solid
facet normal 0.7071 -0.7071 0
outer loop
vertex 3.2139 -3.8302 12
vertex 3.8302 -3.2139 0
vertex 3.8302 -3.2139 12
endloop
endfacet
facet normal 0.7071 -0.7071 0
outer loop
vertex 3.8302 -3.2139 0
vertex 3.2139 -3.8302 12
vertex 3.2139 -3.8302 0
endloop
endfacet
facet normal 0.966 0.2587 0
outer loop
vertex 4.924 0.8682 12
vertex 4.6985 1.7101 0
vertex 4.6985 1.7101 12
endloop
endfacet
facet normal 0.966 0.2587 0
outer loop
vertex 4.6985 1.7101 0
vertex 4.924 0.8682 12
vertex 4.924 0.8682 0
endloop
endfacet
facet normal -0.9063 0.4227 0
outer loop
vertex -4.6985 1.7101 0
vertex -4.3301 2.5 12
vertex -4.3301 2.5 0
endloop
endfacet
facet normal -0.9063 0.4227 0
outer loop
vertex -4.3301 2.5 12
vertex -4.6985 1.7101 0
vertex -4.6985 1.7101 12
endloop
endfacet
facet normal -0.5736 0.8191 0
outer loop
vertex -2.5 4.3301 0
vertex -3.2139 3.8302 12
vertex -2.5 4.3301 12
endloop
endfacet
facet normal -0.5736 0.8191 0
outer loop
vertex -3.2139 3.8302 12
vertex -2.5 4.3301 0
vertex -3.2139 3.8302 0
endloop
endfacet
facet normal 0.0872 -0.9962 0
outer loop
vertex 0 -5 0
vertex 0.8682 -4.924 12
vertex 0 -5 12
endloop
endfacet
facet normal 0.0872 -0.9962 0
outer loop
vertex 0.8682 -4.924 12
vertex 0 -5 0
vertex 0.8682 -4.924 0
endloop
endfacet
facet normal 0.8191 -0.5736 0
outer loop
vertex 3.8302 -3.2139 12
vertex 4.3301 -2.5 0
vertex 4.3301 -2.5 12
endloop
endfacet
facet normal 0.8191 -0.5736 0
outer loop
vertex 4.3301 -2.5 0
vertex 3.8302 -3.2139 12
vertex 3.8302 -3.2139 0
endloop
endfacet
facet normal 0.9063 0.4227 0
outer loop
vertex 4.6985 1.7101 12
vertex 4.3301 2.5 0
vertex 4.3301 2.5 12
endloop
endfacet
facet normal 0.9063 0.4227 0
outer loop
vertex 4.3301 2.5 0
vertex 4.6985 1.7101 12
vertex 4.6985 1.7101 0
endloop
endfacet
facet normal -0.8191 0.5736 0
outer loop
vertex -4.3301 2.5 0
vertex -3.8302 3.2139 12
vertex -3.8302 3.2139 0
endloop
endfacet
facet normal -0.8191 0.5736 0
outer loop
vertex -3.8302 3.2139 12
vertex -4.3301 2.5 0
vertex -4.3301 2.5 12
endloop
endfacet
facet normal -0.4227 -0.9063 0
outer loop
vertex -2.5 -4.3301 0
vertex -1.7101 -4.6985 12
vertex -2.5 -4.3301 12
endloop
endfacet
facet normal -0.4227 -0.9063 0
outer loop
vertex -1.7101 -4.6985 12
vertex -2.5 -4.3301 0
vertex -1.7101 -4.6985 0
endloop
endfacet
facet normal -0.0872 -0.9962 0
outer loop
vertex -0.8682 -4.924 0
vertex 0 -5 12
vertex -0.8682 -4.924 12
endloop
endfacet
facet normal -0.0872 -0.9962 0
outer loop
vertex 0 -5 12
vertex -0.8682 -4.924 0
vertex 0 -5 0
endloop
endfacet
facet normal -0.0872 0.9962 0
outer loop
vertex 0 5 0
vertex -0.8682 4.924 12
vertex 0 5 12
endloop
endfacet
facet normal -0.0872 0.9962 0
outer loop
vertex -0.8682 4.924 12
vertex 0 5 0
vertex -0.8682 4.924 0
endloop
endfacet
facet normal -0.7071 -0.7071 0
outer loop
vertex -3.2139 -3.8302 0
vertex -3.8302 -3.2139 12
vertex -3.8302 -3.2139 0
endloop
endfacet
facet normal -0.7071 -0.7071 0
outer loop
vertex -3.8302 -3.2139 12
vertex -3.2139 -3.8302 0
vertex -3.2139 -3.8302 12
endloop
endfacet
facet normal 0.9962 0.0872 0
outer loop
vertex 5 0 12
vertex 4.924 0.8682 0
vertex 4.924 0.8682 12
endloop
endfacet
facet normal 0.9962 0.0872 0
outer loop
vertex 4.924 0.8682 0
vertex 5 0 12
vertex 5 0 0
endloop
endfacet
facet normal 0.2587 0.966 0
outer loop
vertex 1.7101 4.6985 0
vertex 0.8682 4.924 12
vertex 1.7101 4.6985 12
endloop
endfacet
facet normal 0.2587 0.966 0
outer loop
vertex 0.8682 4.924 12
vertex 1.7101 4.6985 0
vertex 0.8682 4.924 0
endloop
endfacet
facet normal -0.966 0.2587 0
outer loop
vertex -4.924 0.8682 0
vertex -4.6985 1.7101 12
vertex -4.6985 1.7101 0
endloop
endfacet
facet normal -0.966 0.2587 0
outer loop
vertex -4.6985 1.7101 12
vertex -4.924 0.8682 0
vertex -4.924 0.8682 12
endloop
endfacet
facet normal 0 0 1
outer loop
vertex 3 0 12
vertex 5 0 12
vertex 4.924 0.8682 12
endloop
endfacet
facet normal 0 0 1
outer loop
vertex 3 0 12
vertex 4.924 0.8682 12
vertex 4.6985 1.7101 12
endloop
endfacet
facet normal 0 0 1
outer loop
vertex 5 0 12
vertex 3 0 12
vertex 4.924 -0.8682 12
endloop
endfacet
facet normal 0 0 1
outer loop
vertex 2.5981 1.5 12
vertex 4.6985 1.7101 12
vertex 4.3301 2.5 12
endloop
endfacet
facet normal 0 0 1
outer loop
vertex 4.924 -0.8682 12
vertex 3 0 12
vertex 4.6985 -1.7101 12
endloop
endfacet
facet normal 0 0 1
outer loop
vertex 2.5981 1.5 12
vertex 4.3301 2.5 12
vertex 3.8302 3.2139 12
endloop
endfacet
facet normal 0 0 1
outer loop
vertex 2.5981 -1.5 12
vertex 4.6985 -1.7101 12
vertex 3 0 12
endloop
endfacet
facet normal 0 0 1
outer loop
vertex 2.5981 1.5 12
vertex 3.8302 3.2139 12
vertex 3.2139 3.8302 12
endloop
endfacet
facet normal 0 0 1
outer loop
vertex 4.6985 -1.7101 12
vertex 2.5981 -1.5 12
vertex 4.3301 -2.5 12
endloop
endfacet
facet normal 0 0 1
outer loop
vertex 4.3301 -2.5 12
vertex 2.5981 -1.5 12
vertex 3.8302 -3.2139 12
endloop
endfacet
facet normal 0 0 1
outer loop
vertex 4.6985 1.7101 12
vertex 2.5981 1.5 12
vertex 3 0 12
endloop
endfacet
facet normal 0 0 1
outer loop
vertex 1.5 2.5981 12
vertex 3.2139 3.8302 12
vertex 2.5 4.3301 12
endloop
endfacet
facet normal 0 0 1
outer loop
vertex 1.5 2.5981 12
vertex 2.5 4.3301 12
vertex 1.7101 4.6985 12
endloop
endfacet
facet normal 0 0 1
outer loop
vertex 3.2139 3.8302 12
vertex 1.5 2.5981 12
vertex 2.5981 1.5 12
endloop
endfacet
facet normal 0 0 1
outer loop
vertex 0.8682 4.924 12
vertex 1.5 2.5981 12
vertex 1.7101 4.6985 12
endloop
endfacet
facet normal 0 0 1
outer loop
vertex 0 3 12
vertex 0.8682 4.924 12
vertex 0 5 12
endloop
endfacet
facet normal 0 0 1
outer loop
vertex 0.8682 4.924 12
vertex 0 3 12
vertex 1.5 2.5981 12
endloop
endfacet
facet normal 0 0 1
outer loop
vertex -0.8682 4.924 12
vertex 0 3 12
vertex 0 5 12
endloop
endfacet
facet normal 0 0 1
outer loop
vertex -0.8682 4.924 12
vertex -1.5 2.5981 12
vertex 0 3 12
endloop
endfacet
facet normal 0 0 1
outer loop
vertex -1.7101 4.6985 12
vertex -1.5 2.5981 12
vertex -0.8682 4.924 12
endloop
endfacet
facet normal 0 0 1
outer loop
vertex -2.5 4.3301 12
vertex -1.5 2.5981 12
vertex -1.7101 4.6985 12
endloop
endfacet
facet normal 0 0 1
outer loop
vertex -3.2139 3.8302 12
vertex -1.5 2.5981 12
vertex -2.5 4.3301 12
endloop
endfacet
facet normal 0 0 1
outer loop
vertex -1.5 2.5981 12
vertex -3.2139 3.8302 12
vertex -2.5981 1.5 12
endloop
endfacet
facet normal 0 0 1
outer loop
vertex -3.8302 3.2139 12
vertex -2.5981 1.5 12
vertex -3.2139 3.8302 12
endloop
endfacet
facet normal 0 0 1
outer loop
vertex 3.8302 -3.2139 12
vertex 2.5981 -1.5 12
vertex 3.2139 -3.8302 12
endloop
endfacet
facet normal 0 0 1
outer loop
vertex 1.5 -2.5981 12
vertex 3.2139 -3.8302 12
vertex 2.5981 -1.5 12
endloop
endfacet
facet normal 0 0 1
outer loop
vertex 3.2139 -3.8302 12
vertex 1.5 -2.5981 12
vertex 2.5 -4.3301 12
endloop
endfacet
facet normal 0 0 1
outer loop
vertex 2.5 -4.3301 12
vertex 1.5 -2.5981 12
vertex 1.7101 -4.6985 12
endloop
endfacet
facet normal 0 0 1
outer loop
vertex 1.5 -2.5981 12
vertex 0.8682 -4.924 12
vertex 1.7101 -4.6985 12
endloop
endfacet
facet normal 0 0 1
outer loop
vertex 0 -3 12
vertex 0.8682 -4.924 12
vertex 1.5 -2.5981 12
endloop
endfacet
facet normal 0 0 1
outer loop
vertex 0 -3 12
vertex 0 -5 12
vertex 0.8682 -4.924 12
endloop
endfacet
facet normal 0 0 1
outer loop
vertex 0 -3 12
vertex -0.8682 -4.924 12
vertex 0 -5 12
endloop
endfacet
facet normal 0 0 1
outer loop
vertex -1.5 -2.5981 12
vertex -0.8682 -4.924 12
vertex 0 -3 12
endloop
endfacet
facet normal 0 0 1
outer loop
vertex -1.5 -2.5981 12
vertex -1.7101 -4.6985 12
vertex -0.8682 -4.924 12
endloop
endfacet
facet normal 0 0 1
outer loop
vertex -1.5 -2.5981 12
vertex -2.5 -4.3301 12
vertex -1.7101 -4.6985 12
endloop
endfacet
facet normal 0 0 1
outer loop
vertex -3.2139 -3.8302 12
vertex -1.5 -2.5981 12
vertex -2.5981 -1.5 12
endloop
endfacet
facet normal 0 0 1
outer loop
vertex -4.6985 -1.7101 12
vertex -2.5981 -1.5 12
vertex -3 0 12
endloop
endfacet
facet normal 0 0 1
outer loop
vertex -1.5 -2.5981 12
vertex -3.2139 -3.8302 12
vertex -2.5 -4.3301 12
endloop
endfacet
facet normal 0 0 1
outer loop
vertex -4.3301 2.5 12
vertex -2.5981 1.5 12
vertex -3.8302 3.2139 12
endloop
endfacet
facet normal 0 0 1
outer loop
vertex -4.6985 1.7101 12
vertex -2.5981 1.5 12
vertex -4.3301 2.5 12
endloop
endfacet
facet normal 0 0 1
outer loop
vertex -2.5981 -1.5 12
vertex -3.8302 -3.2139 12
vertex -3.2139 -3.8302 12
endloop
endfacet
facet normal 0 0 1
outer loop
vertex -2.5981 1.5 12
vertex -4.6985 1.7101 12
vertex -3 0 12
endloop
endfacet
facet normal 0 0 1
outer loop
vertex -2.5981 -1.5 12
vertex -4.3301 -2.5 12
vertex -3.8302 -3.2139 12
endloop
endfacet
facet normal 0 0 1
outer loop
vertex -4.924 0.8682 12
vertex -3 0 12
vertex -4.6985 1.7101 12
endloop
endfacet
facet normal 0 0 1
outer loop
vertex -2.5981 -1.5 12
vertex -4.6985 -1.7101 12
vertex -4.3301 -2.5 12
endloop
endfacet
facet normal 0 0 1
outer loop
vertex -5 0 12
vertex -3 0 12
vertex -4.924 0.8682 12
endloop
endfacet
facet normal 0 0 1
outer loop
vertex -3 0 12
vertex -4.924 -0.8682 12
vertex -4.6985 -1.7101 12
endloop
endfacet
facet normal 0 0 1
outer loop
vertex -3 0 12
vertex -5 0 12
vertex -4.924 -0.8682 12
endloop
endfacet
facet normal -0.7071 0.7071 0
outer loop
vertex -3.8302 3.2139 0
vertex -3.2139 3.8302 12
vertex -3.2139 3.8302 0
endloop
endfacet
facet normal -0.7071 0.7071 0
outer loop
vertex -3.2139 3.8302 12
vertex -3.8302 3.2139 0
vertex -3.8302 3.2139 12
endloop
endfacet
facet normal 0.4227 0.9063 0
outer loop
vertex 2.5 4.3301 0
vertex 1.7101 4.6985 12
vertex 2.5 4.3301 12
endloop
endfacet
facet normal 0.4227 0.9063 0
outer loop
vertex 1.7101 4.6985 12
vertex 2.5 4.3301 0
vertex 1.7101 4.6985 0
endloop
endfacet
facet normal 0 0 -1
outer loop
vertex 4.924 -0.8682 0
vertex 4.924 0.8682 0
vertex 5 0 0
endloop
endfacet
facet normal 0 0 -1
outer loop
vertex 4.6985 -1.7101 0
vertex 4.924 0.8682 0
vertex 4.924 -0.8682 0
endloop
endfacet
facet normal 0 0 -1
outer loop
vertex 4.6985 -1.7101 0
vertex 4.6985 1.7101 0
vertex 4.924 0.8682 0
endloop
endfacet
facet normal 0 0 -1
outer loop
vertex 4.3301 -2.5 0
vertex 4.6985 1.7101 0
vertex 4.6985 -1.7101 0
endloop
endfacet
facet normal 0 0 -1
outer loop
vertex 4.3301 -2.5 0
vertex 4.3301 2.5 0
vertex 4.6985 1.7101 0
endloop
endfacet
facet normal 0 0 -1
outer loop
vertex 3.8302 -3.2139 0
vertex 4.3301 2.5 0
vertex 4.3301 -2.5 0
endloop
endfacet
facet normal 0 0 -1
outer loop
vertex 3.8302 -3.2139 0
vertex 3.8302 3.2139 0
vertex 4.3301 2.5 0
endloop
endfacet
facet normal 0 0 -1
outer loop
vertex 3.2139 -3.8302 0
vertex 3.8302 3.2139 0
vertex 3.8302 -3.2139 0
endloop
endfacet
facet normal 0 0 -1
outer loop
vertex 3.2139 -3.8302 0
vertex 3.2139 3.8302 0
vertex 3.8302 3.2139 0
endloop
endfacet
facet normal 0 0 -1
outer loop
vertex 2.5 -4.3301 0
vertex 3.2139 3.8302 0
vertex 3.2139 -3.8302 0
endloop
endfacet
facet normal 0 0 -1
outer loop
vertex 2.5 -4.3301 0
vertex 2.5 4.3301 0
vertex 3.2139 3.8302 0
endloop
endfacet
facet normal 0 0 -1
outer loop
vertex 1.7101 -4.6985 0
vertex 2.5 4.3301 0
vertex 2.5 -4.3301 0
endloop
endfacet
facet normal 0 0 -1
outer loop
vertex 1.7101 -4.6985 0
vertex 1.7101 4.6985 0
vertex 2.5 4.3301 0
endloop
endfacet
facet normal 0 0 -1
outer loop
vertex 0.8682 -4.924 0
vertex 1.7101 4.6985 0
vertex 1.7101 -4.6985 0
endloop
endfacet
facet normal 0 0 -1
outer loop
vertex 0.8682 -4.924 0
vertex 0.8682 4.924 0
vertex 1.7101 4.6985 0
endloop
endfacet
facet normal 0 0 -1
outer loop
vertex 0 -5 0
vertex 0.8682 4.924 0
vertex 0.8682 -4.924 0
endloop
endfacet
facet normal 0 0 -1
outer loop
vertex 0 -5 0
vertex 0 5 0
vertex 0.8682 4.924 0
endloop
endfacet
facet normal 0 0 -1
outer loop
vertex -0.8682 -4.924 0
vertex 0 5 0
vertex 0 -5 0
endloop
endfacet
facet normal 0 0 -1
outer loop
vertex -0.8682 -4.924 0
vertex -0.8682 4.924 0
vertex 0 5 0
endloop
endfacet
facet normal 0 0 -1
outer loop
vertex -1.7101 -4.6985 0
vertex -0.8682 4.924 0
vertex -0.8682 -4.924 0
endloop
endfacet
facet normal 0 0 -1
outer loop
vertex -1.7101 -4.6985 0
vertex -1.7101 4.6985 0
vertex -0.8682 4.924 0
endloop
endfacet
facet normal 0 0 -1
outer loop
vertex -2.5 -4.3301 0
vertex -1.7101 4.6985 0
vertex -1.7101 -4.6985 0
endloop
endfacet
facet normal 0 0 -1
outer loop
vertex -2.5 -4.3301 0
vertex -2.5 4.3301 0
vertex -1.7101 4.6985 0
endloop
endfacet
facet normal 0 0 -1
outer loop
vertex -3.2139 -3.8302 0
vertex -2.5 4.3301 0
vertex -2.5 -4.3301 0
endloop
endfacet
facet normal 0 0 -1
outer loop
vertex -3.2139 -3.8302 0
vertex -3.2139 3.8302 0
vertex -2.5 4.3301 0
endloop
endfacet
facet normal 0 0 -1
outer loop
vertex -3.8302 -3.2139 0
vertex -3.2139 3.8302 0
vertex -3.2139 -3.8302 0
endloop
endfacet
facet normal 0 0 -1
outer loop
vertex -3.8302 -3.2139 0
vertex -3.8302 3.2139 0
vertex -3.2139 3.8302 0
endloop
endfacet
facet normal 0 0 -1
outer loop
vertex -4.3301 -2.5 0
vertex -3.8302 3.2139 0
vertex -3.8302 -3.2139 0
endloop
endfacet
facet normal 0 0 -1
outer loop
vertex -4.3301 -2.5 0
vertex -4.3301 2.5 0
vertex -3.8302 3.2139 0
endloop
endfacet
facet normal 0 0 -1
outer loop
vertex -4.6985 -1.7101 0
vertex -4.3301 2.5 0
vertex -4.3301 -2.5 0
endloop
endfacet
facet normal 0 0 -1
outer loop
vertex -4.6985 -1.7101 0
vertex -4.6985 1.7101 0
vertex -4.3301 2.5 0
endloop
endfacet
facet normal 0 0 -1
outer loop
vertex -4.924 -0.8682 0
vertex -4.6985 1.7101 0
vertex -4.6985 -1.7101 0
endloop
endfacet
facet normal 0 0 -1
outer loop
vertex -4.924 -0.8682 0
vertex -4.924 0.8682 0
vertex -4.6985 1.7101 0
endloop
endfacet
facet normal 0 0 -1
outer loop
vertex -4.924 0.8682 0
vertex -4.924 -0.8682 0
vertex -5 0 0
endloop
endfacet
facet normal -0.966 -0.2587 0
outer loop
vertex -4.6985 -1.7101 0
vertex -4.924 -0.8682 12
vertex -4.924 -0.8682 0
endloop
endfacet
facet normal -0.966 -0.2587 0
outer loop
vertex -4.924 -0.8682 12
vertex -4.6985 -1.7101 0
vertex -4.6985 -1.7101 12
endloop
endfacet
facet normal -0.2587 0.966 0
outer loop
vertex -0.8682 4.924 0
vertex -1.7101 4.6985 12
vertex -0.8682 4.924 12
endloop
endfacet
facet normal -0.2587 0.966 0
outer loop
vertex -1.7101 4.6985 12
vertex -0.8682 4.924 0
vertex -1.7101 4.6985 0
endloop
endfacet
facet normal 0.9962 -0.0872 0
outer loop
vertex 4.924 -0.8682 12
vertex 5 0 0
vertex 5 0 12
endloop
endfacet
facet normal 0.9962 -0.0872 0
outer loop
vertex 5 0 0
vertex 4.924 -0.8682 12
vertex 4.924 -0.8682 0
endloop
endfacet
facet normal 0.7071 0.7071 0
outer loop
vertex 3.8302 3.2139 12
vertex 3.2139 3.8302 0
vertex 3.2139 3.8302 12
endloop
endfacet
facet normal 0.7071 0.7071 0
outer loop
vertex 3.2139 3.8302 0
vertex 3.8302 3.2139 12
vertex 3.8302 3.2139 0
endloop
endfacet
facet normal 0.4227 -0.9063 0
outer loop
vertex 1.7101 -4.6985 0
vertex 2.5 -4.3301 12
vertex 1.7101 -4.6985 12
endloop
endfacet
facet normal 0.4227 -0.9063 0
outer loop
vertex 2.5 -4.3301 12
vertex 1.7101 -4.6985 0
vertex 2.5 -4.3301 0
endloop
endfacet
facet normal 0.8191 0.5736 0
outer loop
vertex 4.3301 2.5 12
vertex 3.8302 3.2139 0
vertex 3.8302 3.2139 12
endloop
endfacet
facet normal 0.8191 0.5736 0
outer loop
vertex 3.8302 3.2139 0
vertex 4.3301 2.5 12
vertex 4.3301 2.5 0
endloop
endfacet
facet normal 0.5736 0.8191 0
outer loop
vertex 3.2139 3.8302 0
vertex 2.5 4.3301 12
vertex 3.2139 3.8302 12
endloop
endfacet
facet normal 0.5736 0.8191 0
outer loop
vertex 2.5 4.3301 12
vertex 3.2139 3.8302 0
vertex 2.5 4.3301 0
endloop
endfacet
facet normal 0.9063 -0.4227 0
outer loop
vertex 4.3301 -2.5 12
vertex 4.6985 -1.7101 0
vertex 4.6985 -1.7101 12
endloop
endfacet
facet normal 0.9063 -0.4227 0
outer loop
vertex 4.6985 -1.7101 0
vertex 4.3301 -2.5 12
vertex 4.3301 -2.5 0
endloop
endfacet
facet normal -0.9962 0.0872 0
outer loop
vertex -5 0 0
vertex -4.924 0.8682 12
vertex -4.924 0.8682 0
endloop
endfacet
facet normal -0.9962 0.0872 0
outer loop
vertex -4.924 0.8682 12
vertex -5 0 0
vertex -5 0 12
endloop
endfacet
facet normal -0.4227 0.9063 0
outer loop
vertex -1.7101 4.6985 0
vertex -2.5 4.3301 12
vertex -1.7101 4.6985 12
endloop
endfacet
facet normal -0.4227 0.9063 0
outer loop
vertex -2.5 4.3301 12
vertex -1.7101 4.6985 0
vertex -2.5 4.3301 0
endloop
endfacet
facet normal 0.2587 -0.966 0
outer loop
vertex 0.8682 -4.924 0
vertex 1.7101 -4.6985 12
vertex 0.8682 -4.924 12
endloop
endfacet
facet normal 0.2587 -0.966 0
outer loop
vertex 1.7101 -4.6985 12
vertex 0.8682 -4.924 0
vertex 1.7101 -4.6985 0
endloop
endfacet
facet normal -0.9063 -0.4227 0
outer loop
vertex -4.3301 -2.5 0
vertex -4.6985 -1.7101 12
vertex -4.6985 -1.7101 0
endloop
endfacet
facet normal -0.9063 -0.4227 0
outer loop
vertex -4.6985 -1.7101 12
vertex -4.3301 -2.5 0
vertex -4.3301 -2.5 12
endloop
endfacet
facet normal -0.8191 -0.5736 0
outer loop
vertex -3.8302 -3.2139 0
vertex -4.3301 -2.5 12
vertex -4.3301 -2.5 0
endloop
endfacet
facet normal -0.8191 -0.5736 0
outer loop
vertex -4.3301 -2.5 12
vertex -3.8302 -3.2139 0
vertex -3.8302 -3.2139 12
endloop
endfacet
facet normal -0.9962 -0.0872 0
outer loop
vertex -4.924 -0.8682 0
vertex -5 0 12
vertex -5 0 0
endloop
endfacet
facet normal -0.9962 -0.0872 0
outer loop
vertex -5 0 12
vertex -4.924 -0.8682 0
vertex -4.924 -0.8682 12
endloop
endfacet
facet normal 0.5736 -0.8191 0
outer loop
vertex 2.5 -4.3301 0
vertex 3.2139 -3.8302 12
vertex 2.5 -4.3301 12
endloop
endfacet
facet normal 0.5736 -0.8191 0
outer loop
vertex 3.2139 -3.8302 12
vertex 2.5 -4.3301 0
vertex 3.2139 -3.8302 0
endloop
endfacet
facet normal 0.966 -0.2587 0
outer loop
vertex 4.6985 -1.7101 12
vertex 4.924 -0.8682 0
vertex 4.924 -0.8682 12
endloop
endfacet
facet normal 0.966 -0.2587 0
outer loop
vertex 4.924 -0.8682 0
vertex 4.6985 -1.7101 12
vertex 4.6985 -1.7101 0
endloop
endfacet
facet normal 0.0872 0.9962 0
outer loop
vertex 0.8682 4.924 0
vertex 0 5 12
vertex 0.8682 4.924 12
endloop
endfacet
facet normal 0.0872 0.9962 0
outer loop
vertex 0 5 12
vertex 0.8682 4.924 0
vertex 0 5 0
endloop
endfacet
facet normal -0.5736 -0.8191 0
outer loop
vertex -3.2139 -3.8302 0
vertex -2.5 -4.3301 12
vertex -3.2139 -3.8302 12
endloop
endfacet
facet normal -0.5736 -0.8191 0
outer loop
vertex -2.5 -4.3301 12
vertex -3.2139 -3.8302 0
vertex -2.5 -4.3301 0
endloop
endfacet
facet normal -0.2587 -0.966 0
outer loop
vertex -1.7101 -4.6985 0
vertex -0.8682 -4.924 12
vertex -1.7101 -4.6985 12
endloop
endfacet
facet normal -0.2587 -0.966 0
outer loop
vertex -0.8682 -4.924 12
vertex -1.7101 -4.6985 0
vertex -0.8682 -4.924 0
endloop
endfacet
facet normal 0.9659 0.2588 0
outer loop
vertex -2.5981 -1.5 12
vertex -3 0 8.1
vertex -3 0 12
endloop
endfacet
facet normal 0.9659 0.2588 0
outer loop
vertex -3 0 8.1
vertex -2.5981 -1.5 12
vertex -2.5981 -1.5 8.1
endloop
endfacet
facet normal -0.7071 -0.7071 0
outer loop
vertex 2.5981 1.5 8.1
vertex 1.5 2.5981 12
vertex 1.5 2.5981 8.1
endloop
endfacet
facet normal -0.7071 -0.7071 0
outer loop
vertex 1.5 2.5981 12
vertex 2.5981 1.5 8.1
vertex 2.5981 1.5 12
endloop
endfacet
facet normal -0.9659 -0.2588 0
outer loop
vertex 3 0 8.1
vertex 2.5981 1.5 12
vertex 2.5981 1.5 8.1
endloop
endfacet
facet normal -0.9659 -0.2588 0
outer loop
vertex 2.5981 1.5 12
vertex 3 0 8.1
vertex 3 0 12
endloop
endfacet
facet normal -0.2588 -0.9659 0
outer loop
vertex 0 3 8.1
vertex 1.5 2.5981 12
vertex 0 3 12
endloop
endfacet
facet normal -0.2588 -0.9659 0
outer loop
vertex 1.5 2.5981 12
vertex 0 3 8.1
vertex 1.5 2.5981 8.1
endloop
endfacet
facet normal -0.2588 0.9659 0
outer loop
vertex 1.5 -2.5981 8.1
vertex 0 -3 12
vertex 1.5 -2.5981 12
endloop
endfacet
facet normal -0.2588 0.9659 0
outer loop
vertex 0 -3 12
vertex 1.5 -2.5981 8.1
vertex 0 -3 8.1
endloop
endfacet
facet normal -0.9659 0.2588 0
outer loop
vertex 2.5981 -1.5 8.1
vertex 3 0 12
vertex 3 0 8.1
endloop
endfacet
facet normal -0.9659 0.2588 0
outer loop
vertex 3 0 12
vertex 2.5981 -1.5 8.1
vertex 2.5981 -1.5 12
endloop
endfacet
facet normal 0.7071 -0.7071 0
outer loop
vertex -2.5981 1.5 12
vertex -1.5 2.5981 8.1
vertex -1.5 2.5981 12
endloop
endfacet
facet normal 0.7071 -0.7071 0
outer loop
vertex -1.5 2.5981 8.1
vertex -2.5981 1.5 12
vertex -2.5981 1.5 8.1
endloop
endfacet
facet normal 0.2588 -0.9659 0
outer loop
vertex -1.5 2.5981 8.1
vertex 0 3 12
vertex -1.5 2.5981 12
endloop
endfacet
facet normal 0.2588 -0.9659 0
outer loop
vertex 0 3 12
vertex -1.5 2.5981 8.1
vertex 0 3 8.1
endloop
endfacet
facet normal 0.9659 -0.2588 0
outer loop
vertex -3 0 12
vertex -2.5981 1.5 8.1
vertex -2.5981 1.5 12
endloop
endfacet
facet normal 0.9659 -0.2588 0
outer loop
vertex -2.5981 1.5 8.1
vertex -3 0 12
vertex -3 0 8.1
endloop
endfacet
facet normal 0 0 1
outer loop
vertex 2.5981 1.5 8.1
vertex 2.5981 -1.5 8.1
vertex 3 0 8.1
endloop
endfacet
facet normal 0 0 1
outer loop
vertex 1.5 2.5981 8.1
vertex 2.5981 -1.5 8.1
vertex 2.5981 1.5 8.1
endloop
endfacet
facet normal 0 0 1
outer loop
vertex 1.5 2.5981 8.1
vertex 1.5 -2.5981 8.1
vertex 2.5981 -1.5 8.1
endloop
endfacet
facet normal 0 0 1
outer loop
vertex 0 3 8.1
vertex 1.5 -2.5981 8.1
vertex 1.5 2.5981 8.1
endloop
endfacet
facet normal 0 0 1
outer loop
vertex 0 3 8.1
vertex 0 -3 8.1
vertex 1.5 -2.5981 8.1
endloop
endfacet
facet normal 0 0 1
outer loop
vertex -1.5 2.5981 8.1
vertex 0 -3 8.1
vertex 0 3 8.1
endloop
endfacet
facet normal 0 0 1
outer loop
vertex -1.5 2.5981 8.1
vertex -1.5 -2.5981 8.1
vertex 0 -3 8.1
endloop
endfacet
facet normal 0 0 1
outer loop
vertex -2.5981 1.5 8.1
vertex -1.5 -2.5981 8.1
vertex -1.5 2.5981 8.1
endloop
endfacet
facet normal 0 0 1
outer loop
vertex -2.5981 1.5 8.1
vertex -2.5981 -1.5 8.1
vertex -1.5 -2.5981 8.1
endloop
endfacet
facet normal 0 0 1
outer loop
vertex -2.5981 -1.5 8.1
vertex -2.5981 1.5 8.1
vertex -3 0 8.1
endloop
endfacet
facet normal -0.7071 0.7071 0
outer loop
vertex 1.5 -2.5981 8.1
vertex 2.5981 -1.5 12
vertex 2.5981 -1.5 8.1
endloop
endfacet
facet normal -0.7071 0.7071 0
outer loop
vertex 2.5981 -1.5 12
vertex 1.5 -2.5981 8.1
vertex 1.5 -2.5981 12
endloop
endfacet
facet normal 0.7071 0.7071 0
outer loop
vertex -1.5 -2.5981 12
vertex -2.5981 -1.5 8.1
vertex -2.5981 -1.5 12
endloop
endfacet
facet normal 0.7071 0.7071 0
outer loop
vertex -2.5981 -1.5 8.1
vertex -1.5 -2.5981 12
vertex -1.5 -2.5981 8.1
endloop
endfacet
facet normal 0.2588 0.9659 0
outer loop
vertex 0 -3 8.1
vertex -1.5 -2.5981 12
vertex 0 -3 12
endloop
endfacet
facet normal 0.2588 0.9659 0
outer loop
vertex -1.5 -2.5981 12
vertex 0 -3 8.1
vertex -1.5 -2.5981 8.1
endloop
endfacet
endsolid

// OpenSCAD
$fn=36;

difference() {
	cylinder(r=5, h=12);
	translate([0,0,8.1])
		cylinder(r=3, h=4, $fn=12);
}
